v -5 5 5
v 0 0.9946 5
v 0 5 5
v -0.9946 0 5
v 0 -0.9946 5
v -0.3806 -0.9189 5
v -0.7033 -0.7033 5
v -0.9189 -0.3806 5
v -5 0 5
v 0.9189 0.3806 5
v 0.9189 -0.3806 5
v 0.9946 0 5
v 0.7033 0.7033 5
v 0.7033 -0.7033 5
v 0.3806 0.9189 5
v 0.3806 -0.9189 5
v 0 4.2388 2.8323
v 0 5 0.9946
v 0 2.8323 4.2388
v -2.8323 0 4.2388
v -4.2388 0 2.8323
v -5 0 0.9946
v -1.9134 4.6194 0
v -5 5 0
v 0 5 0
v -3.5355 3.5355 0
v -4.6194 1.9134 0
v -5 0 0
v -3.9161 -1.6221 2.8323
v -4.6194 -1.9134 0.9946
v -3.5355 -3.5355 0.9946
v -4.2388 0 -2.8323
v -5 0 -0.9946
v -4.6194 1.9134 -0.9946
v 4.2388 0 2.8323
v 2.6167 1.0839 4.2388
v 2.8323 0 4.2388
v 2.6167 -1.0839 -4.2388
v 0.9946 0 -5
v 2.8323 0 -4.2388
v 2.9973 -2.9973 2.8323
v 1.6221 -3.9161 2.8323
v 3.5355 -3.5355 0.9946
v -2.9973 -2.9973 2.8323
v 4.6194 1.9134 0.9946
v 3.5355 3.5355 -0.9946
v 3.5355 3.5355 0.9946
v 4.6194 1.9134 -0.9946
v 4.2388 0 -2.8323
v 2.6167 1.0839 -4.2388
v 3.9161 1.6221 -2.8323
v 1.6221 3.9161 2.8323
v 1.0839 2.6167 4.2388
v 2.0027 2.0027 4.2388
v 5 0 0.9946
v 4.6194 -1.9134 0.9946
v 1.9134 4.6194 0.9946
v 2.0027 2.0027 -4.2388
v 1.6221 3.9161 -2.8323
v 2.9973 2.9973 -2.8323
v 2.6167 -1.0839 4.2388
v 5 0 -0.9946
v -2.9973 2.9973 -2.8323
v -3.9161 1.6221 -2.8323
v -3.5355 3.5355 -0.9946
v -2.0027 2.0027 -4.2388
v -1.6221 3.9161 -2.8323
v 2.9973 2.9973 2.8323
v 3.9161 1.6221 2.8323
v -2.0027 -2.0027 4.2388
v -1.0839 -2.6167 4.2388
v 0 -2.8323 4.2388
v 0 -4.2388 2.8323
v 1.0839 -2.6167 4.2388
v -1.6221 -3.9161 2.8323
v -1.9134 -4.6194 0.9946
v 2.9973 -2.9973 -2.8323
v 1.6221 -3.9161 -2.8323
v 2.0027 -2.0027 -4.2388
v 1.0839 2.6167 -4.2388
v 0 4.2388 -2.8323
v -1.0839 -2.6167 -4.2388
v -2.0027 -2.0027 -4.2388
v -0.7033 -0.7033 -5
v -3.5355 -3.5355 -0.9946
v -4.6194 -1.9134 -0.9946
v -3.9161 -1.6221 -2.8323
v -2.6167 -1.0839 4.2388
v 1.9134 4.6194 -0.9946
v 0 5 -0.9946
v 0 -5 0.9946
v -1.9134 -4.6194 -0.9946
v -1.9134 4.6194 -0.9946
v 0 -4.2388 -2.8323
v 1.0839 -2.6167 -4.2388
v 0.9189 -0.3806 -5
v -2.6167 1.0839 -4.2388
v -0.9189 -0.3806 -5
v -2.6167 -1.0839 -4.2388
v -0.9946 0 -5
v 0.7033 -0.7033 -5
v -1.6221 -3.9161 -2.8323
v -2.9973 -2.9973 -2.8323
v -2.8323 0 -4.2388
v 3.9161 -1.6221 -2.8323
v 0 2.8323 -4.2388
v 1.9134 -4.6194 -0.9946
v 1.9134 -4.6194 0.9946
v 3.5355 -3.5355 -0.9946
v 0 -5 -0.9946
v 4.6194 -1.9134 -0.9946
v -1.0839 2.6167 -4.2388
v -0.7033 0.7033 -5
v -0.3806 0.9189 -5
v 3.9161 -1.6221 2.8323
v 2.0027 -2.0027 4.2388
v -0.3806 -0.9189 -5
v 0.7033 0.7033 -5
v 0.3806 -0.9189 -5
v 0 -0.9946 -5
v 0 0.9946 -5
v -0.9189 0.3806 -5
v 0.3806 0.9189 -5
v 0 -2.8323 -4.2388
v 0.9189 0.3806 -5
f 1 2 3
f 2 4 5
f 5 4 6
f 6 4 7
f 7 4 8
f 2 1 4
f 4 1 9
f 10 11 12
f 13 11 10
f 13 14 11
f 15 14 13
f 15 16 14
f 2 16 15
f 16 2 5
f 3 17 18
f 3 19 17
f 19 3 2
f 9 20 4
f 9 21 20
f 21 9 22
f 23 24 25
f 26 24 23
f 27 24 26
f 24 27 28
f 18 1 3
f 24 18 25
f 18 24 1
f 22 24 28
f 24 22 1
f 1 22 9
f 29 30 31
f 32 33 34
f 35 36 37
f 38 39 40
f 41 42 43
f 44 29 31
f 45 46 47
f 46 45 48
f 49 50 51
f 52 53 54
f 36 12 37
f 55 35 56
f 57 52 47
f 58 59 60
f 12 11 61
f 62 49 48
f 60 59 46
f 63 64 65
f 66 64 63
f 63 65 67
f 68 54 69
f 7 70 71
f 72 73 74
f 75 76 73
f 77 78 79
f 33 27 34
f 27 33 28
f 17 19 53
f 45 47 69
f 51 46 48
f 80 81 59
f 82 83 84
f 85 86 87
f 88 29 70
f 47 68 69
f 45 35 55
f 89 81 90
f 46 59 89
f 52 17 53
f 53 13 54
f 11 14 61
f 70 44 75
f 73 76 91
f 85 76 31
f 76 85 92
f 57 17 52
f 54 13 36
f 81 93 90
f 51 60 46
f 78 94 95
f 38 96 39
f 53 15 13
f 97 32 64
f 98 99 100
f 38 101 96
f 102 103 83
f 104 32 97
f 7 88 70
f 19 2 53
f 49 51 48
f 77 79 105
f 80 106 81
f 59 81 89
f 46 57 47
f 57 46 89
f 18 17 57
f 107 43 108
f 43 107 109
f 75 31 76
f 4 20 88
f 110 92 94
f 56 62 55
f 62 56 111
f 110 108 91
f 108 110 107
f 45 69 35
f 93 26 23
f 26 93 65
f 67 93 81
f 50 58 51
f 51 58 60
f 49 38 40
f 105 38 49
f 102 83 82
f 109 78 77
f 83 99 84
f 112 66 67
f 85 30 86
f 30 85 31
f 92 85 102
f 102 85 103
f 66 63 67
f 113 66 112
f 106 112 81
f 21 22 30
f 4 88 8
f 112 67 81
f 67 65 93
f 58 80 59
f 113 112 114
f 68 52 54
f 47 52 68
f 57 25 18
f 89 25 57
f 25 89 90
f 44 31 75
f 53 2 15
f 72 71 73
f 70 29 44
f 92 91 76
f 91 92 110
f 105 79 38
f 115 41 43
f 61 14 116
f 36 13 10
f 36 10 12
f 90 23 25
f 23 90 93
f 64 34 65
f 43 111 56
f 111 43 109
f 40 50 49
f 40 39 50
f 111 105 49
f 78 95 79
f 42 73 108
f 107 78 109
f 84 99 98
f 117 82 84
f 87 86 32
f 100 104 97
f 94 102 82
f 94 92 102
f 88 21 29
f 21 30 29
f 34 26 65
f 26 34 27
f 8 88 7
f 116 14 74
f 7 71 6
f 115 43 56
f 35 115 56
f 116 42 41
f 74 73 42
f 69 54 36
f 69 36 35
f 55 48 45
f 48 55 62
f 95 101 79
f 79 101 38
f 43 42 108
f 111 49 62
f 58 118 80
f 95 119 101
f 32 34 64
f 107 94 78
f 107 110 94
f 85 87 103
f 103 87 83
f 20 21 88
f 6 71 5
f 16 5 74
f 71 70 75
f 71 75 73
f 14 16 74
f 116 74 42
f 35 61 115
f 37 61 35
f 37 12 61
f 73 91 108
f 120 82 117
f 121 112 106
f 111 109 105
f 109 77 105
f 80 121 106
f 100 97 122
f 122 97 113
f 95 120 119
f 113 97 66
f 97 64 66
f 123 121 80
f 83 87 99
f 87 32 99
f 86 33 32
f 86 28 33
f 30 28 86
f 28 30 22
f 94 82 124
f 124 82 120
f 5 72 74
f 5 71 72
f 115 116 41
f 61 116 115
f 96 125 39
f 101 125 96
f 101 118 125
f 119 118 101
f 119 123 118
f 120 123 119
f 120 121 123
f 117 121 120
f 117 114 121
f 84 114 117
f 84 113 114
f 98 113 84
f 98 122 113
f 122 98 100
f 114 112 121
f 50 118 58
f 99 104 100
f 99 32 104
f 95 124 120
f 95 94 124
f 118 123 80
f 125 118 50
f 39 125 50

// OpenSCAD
// test mirror, resize, multmatrix, offset, projection and new math functions

// sign, atan, atan2, asin, acos, log, exp, is_num, is_bool, is_string, is_list
echo("sign(-5):", sign(-5));
echo("sign(0):", sign(0));
echo("sign(3):", sign(3));
echo("atan(1):", atan(1));
echo("atan2(1, 1):", atan2(1, 1));
echo("asin(0.5):", asin(0.5));
echo("acos(0.5):", acos(0.5));
echo("log(100):", log(100));
echo("exp(0):", exp(0));
echo("is_num(3.14):", is_num(3.14));
echo("is_bool(true):", is_bool(true));
echo("is_string(\"hello\"):", is_string("hello"));
echo("is_list([1,2]):", is_list([1, 2]));

// mirror
mirror([1, 0, 0]) {
  cube([5, 5, 5]);
}

// resize
resize([10, 10, 10]) {
  sphere(r=5);
}

// offset (2D)
offset(r=2) {
  square([10, 10]);
}

// projection
projection(cut=false) {
  cube([5, 5, 5]);
}
